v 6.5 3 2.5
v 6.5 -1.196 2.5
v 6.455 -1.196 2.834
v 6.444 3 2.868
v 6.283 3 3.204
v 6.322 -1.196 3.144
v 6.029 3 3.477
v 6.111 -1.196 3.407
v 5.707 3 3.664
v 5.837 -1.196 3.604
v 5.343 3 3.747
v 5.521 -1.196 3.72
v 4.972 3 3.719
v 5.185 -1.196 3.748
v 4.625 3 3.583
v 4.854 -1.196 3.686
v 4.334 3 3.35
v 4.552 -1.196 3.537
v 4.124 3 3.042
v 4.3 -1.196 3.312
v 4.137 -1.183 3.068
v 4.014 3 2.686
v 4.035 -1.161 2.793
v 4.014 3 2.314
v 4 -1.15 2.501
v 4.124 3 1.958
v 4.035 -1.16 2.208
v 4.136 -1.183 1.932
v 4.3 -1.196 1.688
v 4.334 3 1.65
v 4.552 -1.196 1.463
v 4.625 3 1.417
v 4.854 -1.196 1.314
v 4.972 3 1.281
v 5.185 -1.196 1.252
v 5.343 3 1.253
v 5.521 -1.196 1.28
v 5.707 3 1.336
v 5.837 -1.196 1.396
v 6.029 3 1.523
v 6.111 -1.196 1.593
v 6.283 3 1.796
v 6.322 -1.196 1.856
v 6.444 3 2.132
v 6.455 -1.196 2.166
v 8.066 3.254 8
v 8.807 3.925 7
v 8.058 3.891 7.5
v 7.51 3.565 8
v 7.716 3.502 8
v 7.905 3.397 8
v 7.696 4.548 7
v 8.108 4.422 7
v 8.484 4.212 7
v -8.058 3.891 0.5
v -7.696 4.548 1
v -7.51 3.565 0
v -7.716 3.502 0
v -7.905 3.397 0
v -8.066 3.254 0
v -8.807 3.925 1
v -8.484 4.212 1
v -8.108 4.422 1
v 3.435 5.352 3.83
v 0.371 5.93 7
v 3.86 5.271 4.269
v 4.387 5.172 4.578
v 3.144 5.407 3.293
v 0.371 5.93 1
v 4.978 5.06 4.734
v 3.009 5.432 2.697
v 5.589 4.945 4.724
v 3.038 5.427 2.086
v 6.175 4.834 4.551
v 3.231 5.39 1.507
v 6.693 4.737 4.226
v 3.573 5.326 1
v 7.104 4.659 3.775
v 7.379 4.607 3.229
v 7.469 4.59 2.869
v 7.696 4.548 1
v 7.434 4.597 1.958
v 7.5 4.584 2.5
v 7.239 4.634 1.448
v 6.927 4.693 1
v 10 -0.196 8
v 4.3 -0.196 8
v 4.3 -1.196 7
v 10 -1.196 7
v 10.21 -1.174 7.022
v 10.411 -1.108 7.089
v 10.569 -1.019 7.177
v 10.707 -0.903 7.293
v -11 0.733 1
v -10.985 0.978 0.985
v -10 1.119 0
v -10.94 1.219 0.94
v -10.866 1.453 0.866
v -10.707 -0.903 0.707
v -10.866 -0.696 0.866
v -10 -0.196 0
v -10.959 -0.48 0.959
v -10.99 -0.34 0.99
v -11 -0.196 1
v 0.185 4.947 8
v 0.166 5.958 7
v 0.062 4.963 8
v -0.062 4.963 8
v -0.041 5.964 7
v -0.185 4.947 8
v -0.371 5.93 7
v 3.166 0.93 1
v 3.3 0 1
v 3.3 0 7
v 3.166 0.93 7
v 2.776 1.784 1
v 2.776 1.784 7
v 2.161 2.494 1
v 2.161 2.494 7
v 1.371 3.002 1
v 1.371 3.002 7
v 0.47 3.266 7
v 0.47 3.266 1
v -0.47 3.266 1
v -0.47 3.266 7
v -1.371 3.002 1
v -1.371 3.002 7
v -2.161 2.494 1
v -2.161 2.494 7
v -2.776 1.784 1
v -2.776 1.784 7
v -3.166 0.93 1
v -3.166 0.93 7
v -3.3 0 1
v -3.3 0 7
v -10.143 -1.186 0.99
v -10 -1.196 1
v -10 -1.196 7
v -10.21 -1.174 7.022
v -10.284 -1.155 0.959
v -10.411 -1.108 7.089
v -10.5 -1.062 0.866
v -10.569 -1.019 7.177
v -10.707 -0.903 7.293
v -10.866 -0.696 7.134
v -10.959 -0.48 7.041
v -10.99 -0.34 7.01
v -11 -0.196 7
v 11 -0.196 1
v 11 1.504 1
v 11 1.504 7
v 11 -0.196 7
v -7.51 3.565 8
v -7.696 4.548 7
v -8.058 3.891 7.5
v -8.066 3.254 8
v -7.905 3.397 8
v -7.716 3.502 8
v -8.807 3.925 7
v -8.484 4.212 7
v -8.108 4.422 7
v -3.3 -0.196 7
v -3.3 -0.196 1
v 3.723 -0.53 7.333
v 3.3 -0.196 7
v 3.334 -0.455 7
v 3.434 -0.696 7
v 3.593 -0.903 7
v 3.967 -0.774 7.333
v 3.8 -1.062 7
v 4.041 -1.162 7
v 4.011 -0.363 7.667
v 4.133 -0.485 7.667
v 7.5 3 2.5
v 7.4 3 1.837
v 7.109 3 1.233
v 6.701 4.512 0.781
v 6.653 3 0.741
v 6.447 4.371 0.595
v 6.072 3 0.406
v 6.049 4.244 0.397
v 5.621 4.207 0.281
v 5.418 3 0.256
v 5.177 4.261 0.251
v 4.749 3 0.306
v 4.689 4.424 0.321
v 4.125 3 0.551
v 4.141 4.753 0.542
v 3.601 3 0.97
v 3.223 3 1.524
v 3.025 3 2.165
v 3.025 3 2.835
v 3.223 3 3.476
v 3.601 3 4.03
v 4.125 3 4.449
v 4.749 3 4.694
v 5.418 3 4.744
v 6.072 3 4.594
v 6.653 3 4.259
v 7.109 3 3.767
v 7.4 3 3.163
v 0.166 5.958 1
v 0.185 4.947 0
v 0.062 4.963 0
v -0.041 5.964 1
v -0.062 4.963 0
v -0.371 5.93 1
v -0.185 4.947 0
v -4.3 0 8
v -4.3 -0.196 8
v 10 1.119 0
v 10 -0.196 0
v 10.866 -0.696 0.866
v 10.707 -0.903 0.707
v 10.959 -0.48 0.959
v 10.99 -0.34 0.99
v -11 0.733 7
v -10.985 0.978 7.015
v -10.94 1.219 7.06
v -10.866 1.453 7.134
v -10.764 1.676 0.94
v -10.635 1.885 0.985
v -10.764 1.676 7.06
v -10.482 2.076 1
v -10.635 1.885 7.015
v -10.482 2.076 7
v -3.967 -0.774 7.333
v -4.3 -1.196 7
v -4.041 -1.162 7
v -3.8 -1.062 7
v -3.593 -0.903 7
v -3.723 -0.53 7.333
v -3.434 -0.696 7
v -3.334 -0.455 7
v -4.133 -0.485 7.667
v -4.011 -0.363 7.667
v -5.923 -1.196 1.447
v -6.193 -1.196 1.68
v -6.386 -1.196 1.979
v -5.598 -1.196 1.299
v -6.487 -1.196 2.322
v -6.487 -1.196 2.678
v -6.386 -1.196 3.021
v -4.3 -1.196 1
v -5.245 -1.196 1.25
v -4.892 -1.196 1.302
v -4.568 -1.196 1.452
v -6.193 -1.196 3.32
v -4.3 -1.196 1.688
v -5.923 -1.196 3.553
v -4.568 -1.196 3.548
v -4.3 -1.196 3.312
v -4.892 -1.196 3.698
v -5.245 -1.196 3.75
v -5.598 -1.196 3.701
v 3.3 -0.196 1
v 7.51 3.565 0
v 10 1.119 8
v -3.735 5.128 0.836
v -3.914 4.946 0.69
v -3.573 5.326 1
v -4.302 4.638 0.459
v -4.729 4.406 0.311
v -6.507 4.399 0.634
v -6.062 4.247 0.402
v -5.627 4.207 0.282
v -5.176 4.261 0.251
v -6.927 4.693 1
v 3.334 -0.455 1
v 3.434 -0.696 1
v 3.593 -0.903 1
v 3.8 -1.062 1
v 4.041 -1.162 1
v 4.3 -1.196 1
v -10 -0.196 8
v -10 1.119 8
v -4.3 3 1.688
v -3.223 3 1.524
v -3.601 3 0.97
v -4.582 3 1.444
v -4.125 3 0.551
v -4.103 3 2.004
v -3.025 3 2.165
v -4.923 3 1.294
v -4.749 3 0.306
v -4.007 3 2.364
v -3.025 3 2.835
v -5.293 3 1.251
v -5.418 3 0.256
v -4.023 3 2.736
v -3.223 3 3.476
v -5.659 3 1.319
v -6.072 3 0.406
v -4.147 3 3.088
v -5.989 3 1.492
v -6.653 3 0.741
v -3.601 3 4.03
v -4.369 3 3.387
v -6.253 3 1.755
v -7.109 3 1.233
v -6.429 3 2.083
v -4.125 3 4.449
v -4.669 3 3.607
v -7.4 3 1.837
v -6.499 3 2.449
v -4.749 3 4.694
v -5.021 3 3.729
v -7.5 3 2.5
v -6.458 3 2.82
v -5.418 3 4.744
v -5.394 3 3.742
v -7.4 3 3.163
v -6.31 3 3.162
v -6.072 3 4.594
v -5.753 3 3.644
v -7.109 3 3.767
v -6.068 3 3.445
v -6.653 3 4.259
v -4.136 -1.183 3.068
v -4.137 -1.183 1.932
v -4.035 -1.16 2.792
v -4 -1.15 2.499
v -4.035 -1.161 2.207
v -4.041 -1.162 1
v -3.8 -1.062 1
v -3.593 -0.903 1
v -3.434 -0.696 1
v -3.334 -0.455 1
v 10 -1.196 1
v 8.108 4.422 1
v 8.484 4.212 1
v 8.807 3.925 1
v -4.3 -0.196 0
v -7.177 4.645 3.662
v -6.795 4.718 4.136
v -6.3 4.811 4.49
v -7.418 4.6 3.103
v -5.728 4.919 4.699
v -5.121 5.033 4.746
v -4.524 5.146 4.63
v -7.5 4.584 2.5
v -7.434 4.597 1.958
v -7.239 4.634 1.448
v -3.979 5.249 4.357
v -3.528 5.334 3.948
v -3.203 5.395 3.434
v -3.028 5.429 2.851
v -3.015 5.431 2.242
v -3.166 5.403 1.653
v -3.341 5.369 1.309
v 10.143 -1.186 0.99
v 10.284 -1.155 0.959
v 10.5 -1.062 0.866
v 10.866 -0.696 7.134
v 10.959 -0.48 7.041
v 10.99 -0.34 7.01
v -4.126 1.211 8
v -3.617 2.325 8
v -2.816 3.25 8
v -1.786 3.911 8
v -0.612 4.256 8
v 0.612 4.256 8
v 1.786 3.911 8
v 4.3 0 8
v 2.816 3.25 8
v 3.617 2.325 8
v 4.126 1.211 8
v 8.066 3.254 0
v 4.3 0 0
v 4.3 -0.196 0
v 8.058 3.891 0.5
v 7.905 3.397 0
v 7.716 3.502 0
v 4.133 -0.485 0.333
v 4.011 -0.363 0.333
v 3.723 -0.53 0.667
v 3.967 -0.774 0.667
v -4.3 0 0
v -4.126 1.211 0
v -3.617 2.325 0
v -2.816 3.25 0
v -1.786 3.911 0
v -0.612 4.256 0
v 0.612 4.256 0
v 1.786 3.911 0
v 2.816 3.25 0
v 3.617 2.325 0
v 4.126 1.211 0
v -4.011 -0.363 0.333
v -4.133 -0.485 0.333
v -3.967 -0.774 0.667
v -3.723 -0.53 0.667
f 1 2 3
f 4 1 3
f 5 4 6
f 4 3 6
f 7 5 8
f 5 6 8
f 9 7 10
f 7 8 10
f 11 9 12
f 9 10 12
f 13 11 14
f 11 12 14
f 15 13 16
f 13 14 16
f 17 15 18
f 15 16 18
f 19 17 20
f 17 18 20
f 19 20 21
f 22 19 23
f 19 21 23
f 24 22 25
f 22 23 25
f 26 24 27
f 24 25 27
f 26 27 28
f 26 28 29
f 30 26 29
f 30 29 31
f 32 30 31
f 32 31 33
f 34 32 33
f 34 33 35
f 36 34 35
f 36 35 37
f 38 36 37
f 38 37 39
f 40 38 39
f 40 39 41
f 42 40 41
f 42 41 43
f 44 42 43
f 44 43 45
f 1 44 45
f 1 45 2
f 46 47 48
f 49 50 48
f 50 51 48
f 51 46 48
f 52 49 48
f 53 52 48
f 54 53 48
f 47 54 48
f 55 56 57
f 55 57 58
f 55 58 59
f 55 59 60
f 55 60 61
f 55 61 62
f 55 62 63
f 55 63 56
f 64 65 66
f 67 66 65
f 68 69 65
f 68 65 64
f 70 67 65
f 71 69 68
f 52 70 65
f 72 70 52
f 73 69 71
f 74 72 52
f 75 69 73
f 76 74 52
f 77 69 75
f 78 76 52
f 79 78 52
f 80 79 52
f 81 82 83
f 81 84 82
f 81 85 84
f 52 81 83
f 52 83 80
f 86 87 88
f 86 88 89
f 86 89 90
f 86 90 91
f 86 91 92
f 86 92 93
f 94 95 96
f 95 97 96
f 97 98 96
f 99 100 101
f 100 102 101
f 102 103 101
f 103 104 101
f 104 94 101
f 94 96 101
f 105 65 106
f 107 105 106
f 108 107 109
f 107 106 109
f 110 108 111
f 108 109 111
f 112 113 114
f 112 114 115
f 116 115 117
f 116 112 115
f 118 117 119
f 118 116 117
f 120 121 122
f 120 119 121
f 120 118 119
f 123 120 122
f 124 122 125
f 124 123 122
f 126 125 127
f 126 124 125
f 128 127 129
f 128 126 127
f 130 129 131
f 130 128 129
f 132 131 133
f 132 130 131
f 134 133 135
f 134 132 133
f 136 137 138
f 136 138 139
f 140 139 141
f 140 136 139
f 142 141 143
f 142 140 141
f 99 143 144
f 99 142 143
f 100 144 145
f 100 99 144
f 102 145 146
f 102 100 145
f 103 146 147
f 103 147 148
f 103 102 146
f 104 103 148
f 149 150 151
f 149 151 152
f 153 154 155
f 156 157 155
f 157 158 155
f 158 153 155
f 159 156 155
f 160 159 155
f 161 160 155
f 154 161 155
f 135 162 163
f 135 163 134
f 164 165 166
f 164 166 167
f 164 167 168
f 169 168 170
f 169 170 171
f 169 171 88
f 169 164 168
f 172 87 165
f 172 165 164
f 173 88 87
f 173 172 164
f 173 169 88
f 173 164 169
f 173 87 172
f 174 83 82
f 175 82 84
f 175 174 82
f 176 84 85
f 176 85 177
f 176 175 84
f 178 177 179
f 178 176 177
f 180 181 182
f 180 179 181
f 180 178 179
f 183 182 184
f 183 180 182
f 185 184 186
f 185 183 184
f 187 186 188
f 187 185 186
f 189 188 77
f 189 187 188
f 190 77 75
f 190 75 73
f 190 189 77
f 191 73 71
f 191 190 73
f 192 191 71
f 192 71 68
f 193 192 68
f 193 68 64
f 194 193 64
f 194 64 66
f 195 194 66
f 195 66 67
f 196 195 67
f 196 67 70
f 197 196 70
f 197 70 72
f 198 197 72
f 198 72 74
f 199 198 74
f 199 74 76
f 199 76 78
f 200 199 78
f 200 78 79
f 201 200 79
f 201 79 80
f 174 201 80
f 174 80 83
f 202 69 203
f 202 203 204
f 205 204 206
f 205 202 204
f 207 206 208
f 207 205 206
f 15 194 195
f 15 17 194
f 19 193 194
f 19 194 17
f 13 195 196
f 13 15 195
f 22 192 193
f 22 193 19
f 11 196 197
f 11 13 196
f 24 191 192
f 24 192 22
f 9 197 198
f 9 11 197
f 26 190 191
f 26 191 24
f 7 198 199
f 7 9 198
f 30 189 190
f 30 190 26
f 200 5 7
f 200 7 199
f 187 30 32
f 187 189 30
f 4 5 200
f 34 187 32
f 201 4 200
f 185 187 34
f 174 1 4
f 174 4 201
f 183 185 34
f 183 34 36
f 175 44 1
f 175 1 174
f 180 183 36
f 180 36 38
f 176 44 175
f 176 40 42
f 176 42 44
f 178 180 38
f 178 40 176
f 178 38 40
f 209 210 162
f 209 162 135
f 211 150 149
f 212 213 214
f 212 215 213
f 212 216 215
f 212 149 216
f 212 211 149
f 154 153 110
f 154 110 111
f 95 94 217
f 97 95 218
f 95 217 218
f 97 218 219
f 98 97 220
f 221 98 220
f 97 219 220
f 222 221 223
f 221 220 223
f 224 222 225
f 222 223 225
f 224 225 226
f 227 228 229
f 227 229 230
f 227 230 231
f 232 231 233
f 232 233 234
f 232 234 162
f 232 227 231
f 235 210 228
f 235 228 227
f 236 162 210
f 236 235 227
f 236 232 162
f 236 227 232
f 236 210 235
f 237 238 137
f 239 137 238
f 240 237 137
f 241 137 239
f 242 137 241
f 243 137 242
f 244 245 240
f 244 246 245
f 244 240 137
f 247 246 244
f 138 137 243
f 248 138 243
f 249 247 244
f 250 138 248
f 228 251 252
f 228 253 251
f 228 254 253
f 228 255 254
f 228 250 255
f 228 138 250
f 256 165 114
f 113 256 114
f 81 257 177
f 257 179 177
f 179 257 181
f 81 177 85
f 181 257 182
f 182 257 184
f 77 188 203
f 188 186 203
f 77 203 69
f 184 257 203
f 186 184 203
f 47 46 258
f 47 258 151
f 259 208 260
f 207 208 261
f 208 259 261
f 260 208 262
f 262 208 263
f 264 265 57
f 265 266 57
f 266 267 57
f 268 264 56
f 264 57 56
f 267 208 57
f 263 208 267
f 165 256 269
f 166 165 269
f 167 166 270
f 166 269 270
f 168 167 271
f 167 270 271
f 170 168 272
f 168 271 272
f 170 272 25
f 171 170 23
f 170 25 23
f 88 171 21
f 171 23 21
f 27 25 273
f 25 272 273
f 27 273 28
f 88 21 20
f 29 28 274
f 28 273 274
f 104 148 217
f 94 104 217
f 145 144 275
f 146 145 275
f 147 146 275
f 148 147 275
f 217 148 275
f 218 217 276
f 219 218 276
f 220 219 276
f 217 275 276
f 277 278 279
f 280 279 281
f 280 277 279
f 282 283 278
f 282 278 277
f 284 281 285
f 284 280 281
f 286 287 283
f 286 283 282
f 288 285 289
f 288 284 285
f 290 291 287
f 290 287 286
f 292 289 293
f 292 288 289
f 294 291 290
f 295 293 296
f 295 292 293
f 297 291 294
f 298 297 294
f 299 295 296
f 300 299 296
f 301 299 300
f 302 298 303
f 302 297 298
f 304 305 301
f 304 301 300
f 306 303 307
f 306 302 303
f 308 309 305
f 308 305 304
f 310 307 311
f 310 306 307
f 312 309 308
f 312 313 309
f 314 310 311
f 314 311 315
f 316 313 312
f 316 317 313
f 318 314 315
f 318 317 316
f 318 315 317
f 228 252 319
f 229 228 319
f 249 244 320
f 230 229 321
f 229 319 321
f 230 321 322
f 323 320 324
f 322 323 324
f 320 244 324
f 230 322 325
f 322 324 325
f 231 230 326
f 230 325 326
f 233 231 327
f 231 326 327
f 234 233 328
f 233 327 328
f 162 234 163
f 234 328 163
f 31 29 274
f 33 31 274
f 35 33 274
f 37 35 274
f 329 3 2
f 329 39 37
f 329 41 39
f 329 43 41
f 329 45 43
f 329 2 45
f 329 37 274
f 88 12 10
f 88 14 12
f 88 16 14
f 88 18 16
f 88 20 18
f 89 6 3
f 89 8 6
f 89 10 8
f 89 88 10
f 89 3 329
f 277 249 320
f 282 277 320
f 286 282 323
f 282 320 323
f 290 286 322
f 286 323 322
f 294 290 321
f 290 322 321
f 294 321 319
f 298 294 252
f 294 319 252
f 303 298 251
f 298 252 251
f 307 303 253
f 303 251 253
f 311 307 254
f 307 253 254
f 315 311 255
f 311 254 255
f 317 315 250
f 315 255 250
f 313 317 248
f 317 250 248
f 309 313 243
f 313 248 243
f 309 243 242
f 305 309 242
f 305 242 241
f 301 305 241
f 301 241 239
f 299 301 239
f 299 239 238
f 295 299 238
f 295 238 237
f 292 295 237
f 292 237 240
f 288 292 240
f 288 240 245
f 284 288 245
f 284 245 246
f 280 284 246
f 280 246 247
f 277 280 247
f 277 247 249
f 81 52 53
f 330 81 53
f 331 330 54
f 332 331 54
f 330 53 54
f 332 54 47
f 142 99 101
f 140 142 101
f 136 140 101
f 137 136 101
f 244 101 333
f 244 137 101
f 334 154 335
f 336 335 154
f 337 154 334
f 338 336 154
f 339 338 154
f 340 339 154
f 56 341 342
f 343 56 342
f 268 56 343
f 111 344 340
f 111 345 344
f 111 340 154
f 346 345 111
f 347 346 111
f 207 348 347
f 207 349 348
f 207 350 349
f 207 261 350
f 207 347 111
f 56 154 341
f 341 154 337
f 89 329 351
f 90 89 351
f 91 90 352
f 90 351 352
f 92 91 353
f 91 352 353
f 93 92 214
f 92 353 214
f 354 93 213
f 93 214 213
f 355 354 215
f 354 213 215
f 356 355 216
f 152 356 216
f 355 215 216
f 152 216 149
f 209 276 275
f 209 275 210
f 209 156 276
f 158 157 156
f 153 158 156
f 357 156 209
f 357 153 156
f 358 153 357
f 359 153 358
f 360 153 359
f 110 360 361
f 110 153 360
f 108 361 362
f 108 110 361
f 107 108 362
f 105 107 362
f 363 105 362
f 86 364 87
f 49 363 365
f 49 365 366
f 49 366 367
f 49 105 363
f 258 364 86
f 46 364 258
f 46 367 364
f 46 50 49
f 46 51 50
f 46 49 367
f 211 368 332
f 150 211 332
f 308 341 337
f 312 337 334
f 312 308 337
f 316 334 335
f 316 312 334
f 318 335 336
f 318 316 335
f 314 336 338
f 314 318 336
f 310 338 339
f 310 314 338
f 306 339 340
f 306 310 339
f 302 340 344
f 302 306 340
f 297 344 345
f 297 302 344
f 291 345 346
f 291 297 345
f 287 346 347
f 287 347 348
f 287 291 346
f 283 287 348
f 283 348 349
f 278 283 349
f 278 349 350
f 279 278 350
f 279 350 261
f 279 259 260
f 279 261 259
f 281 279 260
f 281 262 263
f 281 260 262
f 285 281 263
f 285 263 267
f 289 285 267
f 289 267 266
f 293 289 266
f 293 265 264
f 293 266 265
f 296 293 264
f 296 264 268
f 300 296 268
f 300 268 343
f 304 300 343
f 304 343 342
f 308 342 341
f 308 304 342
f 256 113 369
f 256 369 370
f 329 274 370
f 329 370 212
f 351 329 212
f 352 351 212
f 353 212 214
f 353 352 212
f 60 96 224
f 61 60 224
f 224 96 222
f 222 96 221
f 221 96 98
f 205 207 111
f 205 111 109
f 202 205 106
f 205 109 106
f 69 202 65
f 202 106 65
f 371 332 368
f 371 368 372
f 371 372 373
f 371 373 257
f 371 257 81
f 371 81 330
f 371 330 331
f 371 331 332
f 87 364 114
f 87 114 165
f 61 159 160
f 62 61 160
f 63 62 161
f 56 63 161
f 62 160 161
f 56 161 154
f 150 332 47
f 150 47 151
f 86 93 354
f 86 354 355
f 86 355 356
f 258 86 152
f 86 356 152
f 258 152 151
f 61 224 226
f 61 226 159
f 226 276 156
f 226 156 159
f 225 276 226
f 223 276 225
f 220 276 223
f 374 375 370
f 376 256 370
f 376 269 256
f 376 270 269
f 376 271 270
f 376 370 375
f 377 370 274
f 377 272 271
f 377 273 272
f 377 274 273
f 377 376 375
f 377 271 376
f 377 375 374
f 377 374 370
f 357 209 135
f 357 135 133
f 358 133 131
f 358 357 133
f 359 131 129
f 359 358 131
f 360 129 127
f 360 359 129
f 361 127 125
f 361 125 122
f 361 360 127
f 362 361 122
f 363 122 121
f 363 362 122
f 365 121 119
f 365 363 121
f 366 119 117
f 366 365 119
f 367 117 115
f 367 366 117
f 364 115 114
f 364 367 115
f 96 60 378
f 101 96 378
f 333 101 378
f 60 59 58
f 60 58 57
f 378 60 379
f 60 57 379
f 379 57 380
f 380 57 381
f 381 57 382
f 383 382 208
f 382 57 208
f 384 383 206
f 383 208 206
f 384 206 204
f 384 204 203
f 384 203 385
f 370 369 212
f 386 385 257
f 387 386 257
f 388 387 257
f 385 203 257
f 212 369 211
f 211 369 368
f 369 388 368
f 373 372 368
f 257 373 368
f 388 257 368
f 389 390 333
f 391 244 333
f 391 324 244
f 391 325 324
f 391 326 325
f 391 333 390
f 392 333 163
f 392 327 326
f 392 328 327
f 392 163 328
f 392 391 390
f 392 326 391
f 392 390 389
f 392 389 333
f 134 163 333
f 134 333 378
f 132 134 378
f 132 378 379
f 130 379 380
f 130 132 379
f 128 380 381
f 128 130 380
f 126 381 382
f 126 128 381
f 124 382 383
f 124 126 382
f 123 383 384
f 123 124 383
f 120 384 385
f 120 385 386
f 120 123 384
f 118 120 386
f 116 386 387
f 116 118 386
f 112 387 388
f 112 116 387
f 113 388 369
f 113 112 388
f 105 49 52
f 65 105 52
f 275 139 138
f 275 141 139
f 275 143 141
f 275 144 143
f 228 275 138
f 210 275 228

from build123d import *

# Parameters (mm, degrees)
BOSS_EXTRUDE1_DEPTH     = 8
CUT_EXTRUDE1_DEPTH      = 15.866068747
CUT_EXTRUDE1_DEPTH_BACK = 15.866068747
SKETCH3_W               = 7.7
SKETCH3_H               = 1.196323822
BOSS_EXTRUDE2_DEPTH     = 8
CHAMFER1_SIZE           = 1
FILLET1_R               = 1
SKETCH4_R               = 1.25
CUT_EXTRUDE2_DEPTH      = 16.387887332
CUT_EXTRUDE3_START      = 3
SKETCH5_R               = 2.25
CUT_EXTRUDE3_DEPTH      = 10
FILLET2_R               = 2
FILLET3_R               = 1
CHAMFER2_SIZE           = 1


# Some blends are built 0.0001 mm under size
with BuildPart() as part:
    # Sketch1 → Boss-Extrude1 (new body)
    with BuildSketch(Plane.XY):
        with BuildLine():
            Line((-3.3, 0), (-11, 0))
            Line((-11, 0), (-11, 6))
            Line((-11, 6), (11, 6))
            Line((11, 6), (11, 0))
            Line((11, 0), (3.3, 0))
            ThreePointArc((3.3, 0), (0, 3.3), (-3.3, 0))
        make_face()
    extrude(amount=BOSS_EXTRUDE1_DEPTH)

    # Sketch2 → Cut-Extrude1 (cut, two sides: drawn at the far end of the back side and taken through both)
    with BuildSketch(Plane.XY.offset(8).offset(-CUT_EXTRUDE1_DEPTH_BACK)):
        Polygon((-8.355690819, 4.422930452), (0, 6), (-11, 6), (-11, 1.504439372), align=None)
        Polygon((11, 6), (0, 6), (8.355690819, 4.422930452), (11, 1.504439372), align=None)
    extrude(amount=CUT_EXTRUDE1_DEPTH + CUT_EXTRUDE1_DEPTH_BACK, mode=Mode.SUBTRACT)

    # Sketch3 → Boss-Extrude2 (add)
    with BuildSketch(Plane.XY.offset(8)):
        with Locations((-7.15, -0.598161911)):
            Rectangle(SKETCH3_W, SKETCH3_H)
        with Locations((7.15, -0.598161911)):
            Rectangle(SKETCH3_W, SKETCH3_H)
    extrude(amount=-BOSS_EXTRUDE2_DEPTH)

    # Chamfer1
    chamfer1_edges = [part.edges().sort_by_distance(p)[0] for p in [
        (11, 0.154057775, 8),
        (-11, 0.154057775, 0),
        (-11, 0.154057775, 8),
        (11, 0.154057775, 0),
    ]]
    chamfer(chamfer1_edges, length=CHAMFER1_SIZE)

    # Fillet1
    fillet1_edges = [part.edges().sort_by_distance(p)[0] for p in [
        (-3.3, -1.196323822, 4),
        (3.3, -1.196323822, 4),
    ]]
    fillet(fillet1_edges, radius=FILLET1_R)

    # Sketch4 → Cut-Extrude2 (cut, through all)
    with BuildSketch(Plane.XZ.offset(1.196323822)):
        with Locations(Location((-5.25, 2.5, 0), (0, 0, 319.464197889))):
            Circle(SKETCH4_R)
        with Locations((5.25, 2.5)):
            Circle(SKETCH4_R)
    extrude(amount=-CUT_EXTRUDE2_DEPTH, mode=Mode.SUBTRACT)

    # Sketch5 → Cut-Extrude3 (cut)
    with BuildSketch(Plane(origin=(0, 0, 0), x_dir=(1, 0, 0), z_dir=(0, 1, 0)).offset(CUT_EXTRUDE3_START)):
        with Locations(Location((-5.25, -2.5, 0), (0, 0, 180))):
            Circle(SKETCH5_R)
        with Locations((5.25, -2.5)):
            Circle(SKETCH5_R)
    extrude(amount=CUT_EXTRUDE3_DEPTH, mode=Mode.SUBTRACT)

    # Fillet2
    fillet2_edges = [part.edges().sort_by_distance(p)[0] for p in [
        (8.355690819, 4.422930452, 4),
        (-8.355690819, 4.422930452, 4),
        (0, 6, 4),
        (-11, 1.504439372, 4),
    ]]
    fillet(fillet2_edges, radius=FILLET2_R)

    # Fillet3
    fillet3_edges = [part.edges().sort_by_distance(p)[0] for p in [
        (11, -1.196323822, 4),
        (-11, -1.196323822, 4),
    ]]
    fillet(fillet3_edges, radius=FILLET3_R)

    # Chamfer2
    chamfer2_edges = [part.edges().sort_by_distance(p)[0] for p in [
        (7.15, -1.196323822, 8),
        (3.592893219, -0.903430603, 8),
        (3.3, -0.098161911, 8),
        (0, 3.3, 8),
        (-3.3, -0.098161911, 8),
        (-3.592893219, -0.903430603, 8),
        (-7.15, -1.196323822, 8),
    ]]
    chamfer(chamfer2_edges, length=CHAMFER2_SIZE - 0.0001)  # a hair under: the kernel refuses the full size
    chamfer2_2_edges = [part.edges().sort_by_distance(p)[0] for p in [
        (7.15, -1.196323822, 0),
        (3.592893219, -0.903430603, 0),
        (3.3, -0.098161911, 0),
        (0, 3.3, 0),
        (-3.3, -0.098161911, 0),
        (-3.592893219, -0.903430603, 0),
        (-7.15, -1.196323822, 0),
    ]]
    chamfer(chamfer2_2_edges, length=CHAMFER2_SIZE - 0.0001)  # a hair under: the kernel refuses the full size
    # the kernel refuses this chamfer: 1 mm, written as the material it takes off along each edge
    with BuildSketch(Plane(origin=(8.806750236, 3.925101796, 0), x_dir=(-0.7407792072905057, -0.6711856247085939, -0.02749587661058639), z_dir=(0.6714394846228174, -0.7410593893133298, 0)), Plane(origin=(-11.7267295, 0.702357082, 0), x_dir=(0.7407792072905062, -0.6711856247085936, -0.02749587661058639), z_dir=(0.6714394846228171, 0.7410593893133303, 0))) as chamfer2_3_piece_1:
        with BuildLine():
            Line((1.028673195, 0), (-0.056547155, -1.027117794))
            Line((-0.056547155, -1.027117794), (-0.076539593, -1.026567876))
            ThreePointArc((-0.076539593, -1.026567876), (-0.034129227, -0.51339783), (-0.019992438, 0.000549918))
            Line((-0.019992438, 0.000549918), (0.000549918, 0.019992438))
            ThreePointArc((0.000549918, 0.019992438), (0.514497665, 0.00585565), (1.029223113, 0.019992438))
            Line((1.029223113, 0.019992438), (1.028673195, 0))
        make_face()
    extrude(amount=4.348834602, mode=Mode.SUBTRACT)
    with BuildSketch(Plane(origin=(7.324631458, 2.582222827, 0), x_dir=(0.7410593893133297, 0.6714394846228176, 0), z_dir=(0.6714394846228176, -0.7410593893133297, 0))) as chamfer2_3_piece_2:
        with BuildLine():
            Line((0.971715729, -0.028284271), (2.028284271, 1.028284271))
            Line((2.028284271, 1.028284271), (2.048284271, 1.028284271))
            ThreePointArc((2.048284271, 1.028284271), (2.02, 0.514142136), (2.02, 0))
            Line((2.02, 0), (2, -0.02))
            ThreePointArc((2, -0.02), (1.485857864, -0.02), (0.971715729, -0.048284271))
            Line((0.971715729, -0.048284271), (0.971715729, -0.028284271))
        make_face()
    revolve(axis=Axis((7.324631458, 2.582222827, 0), (0, 0, 1)), revolution_arc=37.133354948, mode=Mode.SUBTRACT)
    with BuildSketch(Plane(origin=(0.370934753, 5.929989044, 0), x_dir=(-0.18539725465470863, -0.9822788986514536, -0.02749587661058548), z_dir=(0.9826504221581788, -0.1854673767333577, 0)), Plane(origin=(-7.695566211, 4.547523671, 0), x_dir=(0.18539725465470863, -0.9822788986514536, -0.0274958766105855), z_dir=(0.9826504221581788, 0.1854673767333577, 0))) as chamfer2_3_piece_3:
        with BuildLine():
            Line((1.028673195, 0), (-0.056547155, -1.027117794))
            Line((-0.056547155, -1.027117794), (-0.076539593, -1.026567876))
            ThreePointArc((-0.076539593, -1.026567876), (-0.034129227, -0.51339783), (-0.019992438, 0.000549918))
            Line((-0.019992438, 0.000549918), (0.000549918, 0.019992438))
            ThreePointArc((0.000549918, 0.019992438), (0.514497665, 0.00585565), (1.029223113, 0.019992438))
            Line((1.029223113, 0.019992438), (1.028673195, 0))
        make_face()
    extrude(amount=7.45395442, mode=Mode.SUBTRACT)
    with BuildSketch(Plane(origin=(0, 3.964688199, 0), x_dir=(0.1854673767333581, 0.9826504221581787, 0), z_dir=(0.9826504221581787, -0.1854673767333581, 0))) as chamfer2_3_piece_4:
        with BuildLine():
            Line((0.971715729, -0.028284271), (2.028284271, 1.028284271))
            Line((2.028284271, 1.028284271), (2.048284271, 1.028284271))
            ThreePointArc((2.048284271, 1.028284271), (2.02, 0.514142136), (2.02, 0))
            Line((2.02, 0), (2, -0.02))
            ThreePointArc((2, -0.02), (1.485857864, -0.02), (0.971715729, -0.048284271))
            Line((0.971715729, -0.048284271), (0.971715729, -0.028284271))
        make_face()
    revolve(axis=Axis((0, 3.964688199, 0), (0, 0, 1)), revolution_arc=21.376765384, mode=Mode.SUBTRACT)
    with BuildSketch(Plane(origin=(-7.324631458, 2.582222827, 0), x_dir=(-0.1854673767333579, 0.9826504221581787, 0), z_dir=(0.9826504221581787, 0.1854673767333579, 0))) as chamfer2_3_piece_5:
        with BuildLine():
            Line((0.971715729, -0.028284271), (2.028284271, 1.028284271))
            Line((2.028284271, 1.028284271), (2.048284271, 1.028284271))
            ThreePointArc((2.048284271, 1.028284271), (2.02, 0.514142136), (2.02, 0))
            Line((2.02, 0), (2, -0.02))
            ThreePointArc((2, -0.02), (1.485857864, -0.02), (0.971715729, -0.048284271))
            Line((0.971715729, -0.048284271), (0.971715729, -0.028284271))
        make_face()
    revolve(axis=Axis((-7.324631458, 2.582222827, 0), (0, 0, 1)), revolution_arc=37.133354948, mode=Mode.SUBTRACT)
    # the kernel refuses this chamfer: 1 mm, written as the material it takes off along each edge
    with BuildSketch(Plane(origin=(8.806750236, 3.925101796, 8), x_dir=(-0.7407792072905057, -0.6711856247085939, 0.02749587661058564), z_dir=(0.6714394846228174, -0.7410593893133298, 0)), Plane(origin=(-11.7267295, 0.702357082, 8), x_dir=(0.740779207290506, -0.6711856247085934, 0.027495876610585612), z_dir=(0.6714394846228171, 0.7410593893133303, 0))) as chamfer2_4_piece_1:
        with BuildLine():
            Line((1.028673195, 0), (-0.056547155, 1.027117794))
            Line((-0.056547155, 1.027117794), (-0.076539593, 1.026567876))
            ThreePointArc((-0.076539593, 1.026567876), (-0.034129227, 0.51339783), (-0.019992438, -0.000549918))
            Line((-0.019992438, -0.000549918), (0.000549918, -0.019992438))
            ThreePointArc((0.000549918, -0.019992438), (0.514497665, -0.00585565), (1.029223113, -0.019992438))
            Line((1.029223113, -0.019992438), (1.028673195, 0))
        make_face()
    extrude(amount=4.348834602, mode=Mode.SUBTRACT)
    with BuildSketch(Plane(origin=(7.324631458, 2.582222827, 8), x_dir=(0.7410593893133297, 0.6714394846228176, 0), z_dir=(0.6714394846228176, -0.7410593893133297, 0))) as chamfer2_4_piece_2:
        with BuildLine():
            Line((0.971715729, 0.028284271), (2.028284271, -1.028284271))
            Line((2.028284271, -1.028284271), (2.048284271, -1.028284271))
            ThreePointArc((2.048284271, -1.028284271), (2.02, -0.514142136), (2.02, 0))
            Line((2.02, 0), (2, 0.02))
            ThreePointArc((2, 0.02), (1.485857864, 0.02), (0.971715729, 0.048284271))
            Line((0.971715729, 0.048284271), (0.971715729, 0.028284271))
        make_face()
    revolve(axis=Axis((7.324631458, 2.582222827, 8), (0, 0, 1)), revolution_arc=37.133354948, mode=Mode.SUBTRACT)
    with BuildSketch(Plane(origin=(0.370934753, 5.929989044, 8), x_dir=(-0.18539725465470863, -0.9822788986514536, 0.027495876610585605), z_dir=(0.9826504221581788, -0.1854673767333577, 0)), Plane(origin=(-7.695566211, 4.547523671, 8), x_dir=(0.18539725465470863, -0.9822788986514536, 0.02749587661058563), z_dir=(0.9826504221581788, 0.1854673767333577, 0))) as chamfer2_4_piece_3:
        with BuildLine():
            Line((1.028673195, 0), (-0.056547155, 1.027117794))
            Line((-0.056547155, 1.027117794), (-0.076539593, 1.026567876))
            ThreePointArc((-0.076539593, 1.026567876), (-0.034129227, 0.51339783), (-0.019992438, -0.000549918))
            Line((-0.019992438, -0.000549918), (0.000549918, -0.019992438))
            ThreePointArc((0.000549918, -0.019992438), (0.514497665, -0.00585565), (1.029223113, -0.019992438))
            Line((1.029223113, -0.019992438), (1.028673195, 0))
        make_face()
    extrude(amount=7.45395442, mode=Mode.SUBTRACT)
    with BuildSketch(Plane(origin=(0, 3.964688199, 8), x_dir=(0.1854673767333581, 0.9826504221581787, 0), z_dir=(0.9826504221581787, -0.1854673767333581, 0))) as chamfer2_4_piece_4:
        with BuildLine():
            Line((0.971715729, 0.028284271), (2.028284271, -1.028284271))
            Line((2.028284271, -1.028284271), (2.048284271, -1.028284271))
            ThreePointArc((2.048284271, -1.028284271), (2.02, -0.514142136), (2.02, 0))
            Line((2.02, 0), (2, 0.02))
            ThreePointArc((2, 0.02), (1.485857864, 0.02), (0.971715729, 0.048284271))
            Line((0.971715729, 0.048284271), (0.971715729, 0.028284271))
        make_face()
    revolve(axis=Axis((0, 3.964688199, 8), (0, 0, 1)), revolution_arc=21.376765384, mode=Mode.SUBTRACT)
    with BuildSketch(Plane(origin=(-7.324631458, 2.582222827, 8), x_dir=(-0.1854673767333579, 0.9826504221581787, 0), z_dir=(0.9826504221581787, 0.1854673767333579, 0))) as chamfer2_4_piece_5:
        with BuildLine():
            Line((0.971715729, 0.028284271), (2.028284271, -1.028284271))
            Line((2.028284271, -1.028284271), (2.048284271, -1.028284271))
            ThreePointArc((2.048284271, -1.028284271), (2.02, -0.514142136), (2.02, 0))
            Line((2.02, 0), (2, 0.02))
            ThreePointArc((2, 0.02), (1.485857864, 0.02), (0.971715729, 0.048284271))
            Line((0.971715729, 0.048284271), (0.971715729, 0.028284271))
        make_face()
    revolve(axis=Axis((-7.324631458, 2.582222827, 8), (0, 0, 1)), revolution_arc=37.133354948, mode=Mode.SUBTRACT)


solid = part.part
